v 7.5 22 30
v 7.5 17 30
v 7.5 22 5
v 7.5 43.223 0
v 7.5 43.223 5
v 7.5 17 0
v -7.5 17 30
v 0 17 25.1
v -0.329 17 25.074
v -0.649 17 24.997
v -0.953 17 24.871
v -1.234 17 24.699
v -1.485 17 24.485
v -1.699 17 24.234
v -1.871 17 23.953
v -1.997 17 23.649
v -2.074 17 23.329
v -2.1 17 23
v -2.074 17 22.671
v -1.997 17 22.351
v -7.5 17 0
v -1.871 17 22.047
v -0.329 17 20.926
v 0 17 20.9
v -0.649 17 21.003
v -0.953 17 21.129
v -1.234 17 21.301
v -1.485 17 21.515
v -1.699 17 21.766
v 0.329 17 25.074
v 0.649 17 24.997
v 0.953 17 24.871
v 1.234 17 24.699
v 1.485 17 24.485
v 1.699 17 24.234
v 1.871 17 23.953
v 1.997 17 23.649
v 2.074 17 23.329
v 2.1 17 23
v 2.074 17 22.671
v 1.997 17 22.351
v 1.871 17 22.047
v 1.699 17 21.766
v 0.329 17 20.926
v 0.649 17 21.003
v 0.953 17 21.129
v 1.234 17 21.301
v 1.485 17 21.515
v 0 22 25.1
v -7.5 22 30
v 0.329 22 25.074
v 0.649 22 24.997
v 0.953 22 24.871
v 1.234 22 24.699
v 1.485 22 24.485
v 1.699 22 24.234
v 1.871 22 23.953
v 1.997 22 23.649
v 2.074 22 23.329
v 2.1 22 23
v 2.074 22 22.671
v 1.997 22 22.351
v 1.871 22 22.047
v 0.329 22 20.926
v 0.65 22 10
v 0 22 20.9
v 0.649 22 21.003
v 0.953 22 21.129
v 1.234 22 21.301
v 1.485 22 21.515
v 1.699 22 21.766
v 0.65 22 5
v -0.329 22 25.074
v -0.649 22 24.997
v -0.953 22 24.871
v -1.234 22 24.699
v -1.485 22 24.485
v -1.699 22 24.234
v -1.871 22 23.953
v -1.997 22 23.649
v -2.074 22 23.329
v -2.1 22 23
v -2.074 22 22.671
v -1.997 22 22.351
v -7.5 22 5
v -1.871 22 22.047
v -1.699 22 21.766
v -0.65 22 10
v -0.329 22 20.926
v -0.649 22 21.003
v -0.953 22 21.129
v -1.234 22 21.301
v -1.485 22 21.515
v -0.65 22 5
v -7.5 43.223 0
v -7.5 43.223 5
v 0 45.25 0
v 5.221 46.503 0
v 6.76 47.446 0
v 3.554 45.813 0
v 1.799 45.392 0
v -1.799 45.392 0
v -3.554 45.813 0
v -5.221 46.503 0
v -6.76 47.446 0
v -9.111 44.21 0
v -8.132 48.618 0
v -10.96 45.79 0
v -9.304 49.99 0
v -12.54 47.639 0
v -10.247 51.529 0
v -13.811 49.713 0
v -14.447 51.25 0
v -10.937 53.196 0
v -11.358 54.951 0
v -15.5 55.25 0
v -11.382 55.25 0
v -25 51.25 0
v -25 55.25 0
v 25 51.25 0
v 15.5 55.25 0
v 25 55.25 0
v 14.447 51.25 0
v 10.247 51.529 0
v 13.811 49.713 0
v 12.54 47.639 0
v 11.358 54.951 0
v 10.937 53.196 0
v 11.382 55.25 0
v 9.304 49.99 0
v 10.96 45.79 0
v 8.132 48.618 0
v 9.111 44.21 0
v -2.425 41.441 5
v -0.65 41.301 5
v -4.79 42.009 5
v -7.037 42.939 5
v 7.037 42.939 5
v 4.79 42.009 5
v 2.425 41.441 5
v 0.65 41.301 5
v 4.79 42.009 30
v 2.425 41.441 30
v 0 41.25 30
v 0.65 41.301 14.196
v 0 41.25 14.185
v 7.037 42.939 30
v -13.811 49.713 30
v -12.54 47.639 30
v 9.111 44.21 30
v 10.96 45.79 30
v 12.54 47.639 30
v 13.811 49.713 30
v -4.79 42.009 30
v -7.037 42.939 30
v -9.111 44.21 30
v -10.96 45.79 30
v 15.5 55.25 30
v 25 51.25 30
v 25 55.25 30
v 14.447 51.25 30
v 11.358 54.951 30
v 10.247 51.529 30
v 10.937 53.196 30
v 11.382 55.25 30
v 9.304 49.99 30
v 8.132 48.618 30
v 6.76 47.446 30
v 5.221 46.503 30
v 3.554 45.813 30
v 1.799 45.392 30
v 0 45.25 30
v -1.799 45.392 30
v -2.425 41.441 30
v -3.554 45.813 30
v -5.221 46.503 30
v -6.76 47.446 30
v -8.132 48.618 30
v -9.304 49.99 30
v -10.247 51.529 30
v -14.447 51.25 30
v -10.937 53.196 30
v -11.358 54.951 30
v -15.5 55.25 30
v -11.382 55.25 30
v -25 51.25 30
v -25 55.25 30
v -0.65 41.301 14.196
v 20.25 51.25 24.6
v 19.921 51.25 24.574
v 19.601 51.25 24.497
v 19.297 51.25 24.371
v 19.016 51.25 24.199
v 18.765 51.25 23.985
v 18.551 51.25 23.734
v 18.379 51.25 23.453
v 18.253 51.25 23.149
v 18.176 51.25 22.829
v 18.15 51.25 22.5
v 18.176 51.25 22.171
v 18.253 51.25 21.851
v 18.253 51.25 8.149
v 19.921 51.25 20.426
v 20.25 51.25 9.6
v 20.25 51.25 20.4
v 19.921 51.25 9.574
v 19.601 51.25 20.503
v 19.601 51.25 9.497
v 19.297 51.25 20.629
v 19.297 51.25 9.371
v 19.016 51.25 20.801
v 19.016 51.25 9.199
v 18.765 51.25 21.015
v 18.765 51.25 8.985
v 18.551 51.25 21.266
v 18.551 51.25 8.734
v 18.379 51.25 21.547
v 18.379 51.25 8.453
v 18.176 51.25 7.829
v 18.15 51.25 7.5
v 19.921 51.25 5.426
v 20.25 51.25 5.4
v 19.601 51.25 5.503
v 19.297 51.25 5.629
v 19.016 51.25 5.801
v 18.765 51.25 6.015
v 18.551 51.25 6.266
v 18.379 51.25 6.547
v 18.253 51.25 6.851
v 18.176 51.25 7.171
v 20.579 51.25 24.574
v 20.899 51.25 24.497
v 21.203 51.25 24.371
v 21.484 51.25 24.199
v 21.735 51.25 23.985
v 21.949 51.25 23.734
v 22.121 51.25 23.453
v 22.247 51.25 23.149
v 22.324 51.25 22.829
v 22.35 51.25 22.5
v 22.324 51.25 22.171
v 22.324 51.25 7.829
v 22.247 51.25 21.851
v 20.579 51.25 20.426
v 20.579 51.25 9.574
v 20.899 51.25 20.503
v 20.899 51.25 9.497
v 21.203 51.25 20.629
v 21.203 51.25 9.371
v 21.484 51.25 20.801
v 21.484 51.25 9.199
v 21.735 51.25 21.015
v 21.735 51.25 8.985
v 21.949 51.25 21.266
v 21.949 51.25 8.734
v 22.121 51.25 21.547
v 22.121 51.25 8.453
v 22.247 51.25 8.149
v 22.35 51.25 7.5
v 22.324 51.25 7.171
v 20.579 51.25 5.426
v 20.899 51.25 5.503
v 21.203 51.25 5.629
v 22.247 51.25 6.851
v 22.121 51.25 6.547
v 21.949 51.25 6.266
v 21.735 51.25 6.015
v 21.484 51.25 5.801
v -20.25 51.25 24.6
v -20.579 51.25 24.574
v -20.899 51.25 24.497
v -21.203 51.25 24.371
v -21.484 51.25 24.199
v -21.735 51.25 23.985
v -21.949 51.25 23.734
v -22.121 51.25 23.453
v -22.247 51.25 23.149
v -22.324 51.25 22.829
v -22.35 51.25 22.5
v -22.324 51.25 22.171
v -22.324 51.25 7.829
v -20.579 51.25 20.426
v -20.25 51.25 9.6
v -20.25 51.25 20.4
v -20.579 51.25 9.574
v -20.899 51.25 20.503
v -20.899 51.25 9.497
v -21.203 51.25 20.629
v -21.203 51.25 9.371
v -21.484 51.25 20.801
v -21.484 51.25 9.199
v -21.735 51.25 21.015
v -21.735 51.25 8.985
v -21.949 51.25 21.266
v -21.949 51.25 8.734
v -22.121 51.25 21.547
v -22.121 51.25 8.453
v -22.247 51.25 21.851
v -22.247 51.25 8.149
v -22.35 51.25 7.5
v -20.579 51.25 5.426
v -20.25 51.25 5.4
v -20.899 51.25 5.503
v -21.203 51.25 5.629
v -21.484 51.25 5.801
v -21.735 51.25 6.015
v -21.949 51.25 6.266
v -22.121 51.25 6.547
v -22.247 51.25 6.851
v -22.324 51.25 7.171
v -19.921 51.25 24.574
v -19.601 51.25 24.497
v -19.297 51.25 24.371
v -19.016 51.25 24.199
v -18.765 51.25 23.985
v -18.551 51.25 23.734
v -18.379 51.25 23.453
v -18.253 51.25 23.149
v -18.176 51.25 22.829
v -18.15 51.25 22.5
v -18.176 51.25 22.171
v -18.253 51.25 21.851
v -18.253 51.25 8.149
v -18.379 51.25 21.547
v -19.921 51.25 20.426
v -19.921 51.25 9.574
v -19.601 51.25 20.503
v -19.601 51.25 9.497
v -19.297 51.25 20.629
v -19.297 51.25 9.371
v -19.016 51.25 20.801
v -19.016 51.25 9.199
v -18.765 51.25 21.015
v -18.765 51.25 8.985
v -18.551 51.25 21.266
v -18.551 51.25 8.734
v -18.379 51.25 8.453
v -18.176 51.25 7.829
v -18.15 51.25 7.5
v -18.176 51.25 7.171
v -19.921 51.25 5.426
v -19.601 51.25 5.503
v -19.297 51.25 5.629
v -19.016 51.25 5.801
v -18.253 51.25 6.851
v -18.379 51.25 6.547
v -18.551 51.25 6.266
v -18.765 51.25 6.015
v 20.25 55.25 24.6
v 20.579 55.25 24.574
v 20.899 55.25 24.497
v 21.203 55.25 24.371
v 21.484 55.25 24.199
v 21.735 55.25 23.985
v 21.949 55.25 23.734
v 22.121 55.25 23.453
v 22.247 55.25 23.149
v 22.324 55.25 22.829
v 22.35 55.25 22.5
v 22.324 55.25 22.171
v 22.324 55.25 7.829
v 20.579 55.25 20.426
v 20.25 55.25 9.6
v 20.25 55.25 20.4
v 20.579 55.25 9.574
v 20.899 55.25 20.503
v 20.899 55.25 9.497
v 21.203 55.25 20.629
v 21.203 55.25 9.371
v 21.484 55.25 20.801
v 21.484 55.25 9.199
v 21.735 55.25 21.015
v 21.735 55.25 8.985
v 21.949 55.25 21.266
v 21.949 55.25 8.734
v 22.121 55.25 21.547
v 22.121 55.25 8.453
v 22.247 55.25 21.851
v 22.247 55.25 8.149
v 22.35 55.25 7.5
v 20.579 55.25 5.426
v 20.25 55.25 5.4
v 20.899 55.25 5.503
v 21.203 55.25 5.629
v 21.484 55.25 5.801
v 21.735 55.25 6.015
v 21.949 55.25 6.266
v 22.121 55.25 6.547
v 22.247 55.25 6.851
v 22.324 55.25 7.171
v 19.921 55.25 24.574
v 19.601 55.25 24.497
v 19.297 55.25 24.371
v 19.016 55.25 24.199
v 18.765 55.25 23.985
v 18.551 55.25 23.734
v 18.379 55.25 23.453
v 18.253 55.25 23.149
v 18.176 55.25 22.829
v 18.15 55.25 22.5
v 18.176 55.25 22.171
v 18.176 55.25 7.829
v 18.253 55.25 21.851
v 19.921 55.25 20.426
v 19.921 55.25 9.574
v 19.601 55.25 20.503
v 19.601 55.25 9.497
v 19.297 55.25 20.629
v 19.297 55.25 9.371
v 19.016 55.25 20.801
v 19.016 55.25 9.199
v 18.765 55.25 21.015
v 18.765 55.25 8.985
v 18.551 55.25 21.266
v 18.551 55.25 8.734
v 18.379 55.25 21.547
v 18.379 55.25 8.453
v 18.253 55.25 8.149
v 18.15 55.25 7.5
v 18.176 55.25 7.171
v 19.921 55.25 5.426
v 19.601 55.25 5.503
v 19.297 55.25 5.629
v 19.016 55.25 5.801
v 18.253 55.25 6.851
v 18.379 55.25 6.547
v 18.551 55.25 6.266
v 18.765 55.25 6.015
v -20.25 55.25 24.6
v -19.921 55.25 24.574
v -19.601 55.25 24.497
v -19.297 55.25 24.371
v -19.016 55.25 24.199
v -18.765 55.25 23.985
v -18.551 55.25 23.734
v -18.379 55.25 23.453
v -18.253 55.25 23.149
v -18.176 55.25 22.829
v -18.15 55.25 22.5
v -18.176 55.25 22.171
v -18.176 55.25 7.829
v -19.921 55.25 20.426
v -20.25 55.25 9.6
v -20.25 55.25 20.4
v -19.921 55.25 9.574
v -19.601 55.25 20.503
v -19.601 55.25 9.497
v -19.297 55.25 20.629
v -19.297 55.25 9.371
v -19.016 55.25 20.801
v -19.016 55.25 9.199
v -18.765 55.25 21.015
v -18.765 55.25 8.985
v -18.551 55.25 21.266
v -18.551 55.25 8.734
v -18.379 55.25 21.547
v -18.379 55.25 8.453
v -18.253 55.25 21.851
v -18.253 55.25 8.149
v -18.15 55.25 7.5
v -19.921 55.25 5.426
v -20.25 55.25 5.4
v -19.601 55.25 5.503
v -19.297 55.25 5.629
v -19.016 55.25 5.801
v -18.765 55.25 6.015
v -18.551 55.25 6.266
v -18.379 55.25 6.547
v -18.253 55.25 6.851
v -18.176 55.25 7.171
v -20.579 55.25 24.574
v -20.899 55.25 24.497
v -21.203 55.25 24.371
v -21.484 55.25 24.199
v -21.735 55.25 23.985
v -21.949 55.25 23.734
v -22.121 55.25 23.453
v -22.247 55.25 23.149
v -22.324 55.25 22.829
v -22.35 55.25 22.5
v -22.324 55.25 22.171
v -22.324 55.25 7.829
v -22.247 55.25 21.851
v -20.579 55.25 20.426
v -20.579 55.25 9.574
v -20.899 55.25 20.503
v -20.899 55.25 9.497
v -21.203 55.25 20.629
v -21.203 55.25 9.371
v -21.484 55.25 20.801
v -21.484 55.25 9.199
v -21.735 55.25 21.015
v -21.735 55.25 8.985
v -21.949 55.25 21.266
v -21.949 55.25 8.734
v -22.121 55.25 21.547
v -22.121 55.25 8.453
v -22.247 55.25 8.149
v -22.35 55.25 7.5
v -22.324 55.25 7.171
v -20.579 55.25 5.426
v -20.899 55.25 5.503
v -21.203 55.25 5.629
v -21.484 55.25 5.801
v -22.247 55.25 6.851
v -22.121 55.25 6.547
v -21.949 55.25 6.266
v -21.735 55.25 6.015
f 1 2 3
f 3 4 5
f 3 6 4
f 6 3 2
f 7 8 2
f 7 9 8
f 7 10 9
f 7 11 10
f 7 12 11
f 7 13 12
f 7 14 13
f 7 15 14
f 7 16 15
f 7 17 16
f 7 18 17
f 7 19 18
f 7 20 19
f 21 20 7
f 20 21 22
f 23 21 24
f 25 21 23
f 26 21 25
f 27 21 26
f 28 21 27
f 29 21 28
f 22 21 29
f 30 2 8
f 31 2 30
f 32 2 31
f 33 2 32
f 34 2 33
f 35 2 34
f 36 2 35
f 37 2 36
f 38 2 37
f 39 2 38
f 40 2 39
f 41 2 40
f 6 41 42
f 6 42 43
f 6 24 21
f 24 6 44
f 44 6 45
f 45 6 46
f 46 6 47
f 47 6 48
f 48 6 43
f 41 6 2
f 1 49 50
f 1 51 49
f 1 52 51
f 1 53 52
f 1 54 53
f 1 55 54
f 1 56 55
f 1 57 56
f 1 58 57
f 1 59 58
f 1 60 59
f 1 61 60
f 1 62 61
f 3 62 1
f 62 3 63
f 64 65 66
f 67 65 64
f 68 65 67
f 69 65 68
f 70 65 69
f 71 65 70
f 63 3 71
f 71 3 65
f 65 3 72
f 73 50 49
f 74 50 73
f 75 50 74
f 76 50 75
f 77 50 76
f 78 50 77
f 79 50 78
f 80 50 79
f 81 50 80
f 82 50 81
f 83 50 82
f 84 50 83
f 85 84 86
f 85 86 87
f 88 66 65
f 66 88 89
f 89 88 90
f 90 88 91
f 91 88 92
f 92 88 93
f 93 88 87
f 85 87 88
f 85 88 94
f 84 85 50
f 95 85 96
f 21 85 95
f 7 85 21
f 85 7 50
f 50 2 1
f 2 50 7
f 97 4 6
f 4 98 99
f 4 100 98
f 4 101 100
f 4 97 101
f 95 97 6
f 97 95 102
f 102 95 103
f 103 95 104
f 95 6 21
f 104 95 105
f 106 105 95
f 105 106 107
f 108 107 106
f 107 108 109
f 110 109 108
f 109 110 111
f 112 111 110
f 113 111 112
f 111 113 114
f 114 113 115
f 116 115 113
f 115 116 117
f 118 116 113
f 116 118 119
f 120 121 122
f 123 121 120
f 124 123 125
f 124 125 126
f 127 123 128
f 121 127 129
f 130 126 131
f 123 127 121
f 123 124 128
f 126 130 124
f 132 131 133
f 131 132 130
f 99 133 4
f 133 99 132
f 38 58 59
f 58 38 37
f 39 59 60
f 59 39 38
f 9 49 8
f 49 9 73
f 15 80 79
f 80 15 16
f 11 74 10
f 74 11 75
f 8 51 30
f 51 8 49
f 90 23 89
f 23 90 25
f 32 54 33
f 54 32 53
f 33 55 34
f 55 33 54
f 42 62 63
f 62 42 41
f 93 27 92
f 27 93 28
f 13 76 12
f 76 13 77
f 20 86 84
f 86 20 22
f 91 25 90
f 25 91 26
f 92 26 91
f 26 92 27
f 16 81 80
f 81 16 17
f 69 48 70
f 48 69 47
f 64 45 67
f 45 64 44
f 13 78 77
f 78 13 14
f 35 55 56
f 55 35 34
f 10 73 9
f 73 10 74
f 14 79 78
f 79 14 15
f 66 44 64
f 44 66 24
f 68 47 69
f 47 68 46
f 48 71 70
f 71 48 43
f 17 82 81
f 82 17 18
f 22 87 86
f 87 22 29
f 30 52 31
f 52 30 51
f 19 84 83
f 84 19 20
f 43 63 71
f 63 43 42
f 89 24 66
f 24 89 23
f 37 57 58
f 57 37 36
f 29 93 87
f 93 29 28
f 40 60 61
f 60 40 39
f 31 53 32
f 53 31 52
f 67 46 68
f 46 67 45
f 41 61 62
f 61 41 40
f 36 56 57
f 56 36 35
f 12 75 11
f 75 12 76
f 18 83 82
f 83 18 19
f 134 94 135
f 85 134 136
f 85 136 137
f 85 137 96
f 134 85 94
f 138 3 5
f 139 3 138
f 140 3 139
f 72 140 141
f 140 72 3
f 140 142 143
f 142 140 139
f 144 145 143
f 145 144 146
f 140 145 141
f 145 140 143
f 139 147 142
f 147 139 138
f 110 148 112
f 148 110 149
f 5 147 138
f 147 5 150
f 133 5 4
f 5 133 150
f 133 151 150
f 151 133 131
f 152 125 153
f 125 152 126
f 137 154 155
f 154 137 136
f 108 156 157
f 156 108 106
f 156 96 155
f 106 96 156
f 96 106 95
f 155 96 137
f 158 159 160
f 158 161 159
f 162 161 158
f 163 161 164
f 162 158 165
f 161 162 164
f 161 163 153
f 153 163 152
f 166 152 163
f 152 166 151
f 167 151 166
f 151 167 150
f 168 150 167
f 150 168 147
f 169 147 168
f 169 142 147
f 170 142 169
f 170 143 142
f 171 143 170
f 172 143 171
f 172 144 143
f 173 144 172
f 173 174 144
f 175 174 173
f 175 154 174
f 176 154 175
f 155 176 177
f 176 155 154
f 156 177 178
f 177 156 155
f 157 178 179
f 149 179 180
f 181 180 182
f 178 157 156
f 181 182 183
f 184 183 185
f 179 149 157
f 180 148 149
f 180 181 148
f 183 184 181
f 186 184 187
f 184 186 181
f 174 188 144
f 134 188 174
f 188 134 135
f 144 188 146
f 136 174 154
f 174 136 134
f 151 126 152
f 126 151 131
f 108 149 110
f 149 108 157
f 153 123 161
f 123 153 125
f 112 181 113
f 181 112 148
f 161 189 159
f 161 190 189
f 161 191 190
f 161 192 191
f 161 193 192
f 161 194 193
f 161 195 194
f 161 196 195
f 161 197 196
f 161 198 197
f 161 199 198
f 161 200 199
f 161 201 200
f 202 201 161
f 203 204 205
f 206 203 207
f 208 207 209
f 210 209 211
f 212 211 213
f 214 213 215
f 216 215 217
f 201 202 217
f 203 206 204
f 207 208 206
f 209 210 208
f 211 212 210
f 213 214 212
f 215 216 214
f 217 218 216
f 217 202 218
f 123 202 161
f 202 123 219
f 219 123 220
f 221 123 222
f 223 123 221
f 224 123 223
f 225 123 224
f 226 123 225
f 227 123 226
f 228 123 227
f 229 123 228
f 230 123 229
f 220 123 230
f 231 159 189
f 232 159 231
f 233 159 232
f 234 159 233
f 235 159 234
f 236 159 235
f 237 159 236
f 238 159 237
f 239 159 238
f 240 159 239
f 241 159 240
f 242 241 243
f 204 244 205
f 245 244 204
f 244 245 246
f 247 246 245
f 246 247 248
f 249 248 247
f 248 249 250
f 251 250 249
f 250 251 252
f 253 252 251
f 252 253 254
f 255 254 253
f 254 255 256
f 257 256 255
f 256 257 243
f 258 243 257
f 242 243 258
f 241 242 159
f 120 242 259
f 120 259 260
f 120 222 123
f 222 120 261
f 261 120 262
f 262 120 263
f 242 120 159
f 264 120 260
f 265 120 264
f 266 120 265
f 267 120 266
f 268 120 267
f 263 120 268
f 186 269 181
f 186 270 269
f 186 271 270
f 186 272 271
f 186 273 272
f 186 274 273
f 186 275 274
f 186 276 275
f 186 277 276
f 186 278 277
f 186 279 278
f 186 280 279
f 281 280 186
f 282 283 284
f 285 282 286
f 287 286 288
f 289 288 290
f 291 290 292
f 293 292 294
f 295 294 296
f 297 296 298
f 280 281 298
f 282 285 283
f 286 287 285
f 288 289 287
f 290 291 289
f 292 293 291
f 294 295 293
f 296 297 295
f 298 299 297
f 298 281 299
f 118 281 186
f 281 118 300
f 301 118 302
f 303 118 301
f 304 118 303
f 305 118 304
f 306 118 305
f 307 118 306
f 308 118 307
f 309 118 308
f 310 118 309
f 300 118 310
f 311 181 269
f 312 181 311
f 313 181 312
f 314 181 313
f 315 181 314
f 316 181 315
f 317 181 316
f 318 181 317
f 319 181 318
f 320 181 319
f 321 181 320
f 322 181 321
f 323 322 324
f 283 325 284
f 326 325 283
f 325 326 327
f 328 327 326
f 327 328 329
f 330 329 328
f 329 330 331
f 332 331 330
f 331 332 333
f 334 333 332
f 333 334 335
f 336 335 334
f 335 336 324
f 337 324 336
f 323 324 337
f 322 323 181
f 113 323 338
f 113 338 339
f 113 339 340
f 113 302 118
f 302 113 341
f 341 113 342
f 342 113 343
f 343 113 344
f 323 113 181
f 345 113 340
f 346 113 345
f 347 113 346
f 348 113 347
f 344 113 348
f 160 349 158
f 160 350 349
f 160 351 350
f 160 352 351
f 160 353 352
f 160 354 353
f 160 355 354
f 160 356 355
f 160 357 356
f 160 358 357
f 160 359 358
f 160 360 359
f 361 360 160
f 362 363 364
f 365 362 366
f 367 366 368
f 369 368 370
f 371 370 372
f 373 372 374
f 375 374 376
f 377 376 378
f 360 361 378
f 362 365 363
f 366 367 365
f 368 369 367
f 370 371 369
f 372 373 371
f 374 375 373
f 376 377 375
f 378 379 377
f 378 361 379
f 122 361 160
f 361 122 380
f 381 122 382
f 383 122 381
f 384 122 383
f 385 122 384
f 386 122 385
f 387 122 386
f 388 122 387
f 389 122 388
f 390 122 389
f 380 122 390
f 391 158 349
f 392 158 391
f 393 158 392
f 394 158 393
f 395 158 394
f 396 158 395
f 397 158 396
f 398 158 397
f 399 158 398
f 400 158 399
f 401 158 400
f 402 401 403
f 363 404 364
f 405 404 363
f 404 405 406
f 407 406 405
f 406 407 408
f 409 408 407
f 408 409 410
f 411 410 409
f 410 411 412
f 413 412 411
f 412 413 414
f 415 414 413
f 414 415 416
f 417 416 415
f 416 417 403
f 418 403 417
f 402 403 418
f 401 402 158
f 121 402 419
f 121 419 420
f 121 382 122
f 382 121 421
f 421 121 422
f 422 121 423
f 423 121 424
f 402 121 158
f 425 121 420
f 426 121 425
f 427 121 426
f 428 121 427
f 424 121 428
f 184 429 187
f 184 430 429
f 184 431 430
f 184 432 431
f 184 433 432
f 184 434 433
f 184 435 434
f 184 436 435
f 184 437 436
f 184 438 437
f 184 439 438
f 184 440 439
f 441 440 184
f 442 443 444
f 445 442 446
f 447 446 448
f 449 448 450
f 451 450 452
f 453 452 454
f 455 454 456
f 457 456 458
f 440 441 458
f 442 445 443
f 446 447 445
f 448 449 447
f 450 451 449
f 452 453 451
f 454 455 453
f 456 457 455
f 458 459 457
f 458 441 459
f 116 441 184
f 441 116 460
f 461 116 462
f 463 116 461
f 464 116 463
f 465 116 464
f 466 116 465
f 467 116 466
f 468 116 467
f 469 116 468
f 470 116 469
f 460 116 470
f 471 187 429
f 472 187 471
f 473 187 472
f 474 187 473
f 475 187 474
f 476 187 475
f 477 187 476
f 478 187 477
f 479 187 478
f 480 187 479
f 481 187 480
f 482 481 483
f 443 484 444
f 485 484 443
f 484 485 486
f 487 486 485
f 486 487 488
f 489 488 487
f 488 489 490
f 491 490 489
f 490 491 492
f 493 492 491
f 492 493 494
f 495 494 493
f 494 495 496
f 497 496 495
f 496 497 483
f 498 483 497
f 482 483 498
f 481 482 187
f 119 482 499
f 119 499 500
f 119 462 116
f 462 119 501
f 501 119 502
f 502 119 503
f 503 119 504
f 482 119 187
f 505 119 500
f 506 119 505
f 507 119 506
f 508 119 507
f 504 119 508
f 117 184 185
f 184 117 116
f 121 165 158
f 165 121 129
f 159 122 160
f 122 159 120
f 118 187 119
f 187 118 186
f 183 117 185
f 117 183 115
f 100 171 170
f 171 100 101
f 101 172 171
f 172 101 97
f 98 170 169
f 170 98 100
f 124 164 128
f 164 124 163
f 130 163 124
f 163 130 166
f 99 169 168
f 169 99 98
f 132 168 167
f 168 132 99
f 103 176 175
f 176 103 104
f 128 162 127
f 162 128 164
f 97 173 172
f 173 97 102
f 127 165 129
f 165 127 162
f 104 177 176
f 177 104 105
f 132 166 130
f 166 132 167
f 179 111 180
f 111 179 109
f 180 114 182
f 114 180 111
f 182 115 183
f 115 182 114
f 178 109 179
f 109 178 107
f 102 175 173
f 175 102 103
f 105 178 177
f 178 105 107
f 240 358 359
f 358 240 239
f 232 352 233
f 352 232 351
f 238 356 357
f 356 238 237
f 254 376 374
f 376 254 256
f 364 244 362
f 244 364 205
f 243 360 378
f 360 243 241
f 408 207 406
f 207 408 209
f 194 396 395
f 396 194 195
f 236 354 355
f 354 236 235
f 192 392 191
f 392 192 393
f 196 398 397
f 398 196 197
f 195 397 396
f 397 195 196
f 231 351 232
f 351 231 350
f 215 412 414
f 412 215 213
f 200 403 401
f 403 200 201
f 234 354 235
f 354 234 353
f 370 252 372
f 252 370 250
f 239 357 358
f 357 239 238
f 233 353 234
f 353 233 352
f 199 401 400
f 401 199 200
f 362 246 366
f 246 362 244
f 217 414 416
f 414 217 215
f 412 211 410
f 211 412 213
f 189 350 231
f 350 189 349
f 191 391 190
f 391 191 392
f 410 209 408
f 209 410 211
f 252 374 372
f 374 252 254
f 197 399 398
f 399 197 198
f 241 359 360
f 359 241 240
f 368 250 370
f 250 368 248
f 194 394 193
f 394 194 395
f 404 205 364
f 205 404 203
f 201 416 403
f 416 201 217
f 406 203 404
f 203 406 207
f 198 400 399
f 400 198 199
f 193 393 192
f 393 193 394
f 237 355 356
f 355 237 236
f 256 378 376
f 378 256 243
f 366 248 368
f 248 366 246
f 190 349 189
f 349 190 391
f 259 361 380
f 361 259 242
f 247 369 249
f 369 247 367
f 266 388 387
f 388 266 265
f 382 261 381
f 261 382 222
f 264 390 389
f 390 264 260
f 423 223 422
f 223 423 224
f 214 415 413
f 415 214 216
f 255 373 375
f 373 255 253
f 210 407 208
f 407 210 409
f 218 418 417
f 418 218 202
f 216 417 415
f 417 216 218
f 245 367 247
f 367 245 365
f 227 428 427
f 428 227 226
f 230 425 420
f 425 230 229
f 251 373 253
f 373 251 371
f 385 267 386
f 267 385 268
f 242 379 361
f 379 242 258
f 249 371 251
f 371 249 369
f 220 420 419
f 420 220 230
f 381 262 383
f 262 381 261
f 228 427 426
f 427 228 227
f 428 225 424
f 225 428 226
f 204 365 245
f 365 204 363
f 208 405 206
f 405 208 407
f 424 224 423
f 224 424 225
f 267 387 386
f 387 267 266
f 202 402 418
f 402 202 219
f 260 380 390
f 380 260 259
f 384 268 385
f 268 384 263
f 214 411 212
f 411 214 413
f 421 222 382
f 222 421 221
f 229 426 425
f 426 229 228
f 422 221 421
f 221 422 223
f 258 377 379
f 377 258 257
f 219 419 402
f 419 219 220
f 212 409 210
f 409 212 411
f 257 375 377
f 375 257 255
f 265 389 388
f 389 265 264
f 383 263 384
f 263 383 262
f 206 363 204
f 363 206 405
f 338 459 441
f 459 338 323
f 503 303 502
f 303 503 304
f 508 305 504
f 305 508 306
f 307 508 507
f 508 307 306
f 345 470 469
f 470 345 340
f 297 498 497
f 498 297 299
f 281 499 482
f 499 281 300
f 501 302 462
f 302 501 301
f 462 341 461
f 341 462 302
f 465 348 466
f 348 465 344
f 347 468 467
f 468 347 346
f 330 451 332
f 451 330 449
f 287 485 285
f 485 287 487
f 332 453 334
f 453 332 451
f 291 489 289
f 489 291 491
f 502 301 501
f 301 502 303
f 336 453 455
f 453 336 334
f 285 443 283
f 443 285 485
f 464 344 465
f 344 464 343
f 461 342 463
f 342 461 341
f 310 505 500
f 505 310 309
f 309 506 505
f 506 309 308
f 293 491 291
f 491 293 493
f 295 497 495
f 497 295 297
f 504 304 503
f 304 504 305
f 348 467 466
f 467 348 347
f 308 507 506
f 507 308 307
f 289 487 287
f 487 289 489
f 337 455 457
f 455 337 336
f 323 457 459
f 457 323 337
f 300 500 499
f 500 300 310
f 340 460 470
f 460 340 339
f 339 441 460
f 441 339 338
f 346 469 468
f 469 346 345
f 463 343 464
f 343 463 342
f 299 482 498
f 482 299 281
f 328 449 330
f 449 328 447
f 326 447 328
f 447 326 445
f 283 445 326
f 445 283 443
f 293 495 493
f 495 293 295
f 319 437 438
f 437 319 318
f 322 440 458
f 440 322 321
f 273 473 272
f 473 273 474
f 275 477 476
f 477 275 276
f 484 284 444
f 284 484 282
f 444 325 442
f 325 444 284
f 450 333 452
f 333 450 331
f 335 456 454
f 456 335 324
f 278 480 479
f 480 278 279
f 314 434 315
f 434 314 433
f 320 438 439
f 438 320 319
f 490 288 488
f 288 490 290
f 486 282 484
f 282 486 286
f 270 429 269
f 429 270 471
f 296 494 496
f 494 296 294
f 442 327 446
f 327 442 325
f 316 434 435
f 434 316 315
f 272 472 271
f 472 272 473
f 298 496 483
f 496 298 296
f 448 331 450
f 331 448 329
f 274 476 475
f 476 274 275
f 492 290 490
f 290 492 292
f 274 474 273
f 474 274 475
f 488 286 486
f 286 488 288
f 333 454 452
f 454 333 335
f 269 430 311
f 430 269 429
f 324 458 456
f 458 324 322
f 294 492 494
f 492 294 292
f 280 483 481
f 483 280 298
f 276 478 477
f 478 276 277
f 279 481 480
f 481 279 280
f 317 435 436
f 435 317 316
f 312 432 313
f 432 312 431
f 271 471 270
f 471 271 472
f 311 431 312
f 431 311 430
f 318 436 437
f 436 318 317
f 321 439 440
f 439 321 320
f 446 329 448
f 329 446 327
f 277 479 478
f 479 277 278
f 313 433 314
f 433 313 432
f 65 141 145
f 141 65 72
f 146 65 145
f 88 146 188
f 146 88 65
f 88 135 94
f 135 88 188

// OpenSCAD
// file: ../SRC/ISLHOLDER01A_D04.scad
$fn=40; // model faces resolution.
include <../configuration2.scad>


//Drzak na sloup - cast bez drzaku anemometru
module ISLHOLDER01A_D04(){
	
difference()
    {
    union()
        {
        //základní válec
        cylinder(h=D02_vyska_uchytky,r=(D02_prumer_obruby+2*D02_sila_materialu)/2,center=true);
		//úchytové plošky		
        translate([D02_dotahova_vzdalenost+D02_sila_materialu/2,0,0]){cube([D02_sila_materialu,D02_delka_celeho_uchytu,D02_vyska_uchytky],center=true);}
		}
    
    //válec na odečet
    cylinder(h=D02_vyska_uchytky+0.01,r=D02_prumer_obruby/2,center=true);     
	        
    //kvádr na odecet
	translate([D02_dotahova_vzdalenost-(D02_prumer_obruby+2*D02_sila_materialu)/2,0,0]){cube([D02_prumer_obruby+2*D02_sila_materialu,D02_prumer_obruby+2*D02_sila_materialu,D02_vyska_uchytky+0.01],center=true);}
		
	//otvory na sroub
	translate([D02_dotahova_vzdalenost,(D02_delka_celeho_uchytu/2-D02_prumer_obruby/2-D02_sila_materialu)/2+D02_prumer_obruby/2+D02_sila_materialu,D02_vyska_uchytky/4]){rotate([0,90,0]){cylinder(h=D02_sila_materialu+0.01,r=D02_prumer_uchytneho_sroubu/2);}}
    
     //drzak matky
    translate([D02_dotahova_vzdalenost+D02_sila_materialu-D02_vyska_matky,(D02_delka_celeho_uchytu/2-D02_prumer_obruby/2-D02_sila_materialu)/2+D02_prumer_obruby/2+D02_sila_materialu,D02_vyska_uchytky/4]){rotate([0,90,0]){ cylinder (h = D02_vyska_matky+0.01, r= (D02_sirka_matky+0.2)/2, $fn=6);}}
   
     
        
    translate([D02_dotahova_vzdalenost,(D02_delka_celeho_uchytu/2-D02_prumer_obruby/2-D02_sila_materialu)/2+D02_prumer_obruby/2+D02_sila_materialu,-D02_vyska_uchytky/4]){rotate([0,90,0]){cylinder(h=D02_sila_materialu+0.01,r=D02_prumer_uchytneho_sroubu/2);}}
    
     //drzak matky
    translate([D02_dotahova_vzdalenost+D02_sila_materialu-D02_vyska_matky,(D02_delka_celeho_uchytu/2-D02_prumer_obruby/2-D02_sila_materialu)/2+D02_prumer_obruby/2+D02_sila_materialu,-D02_vyska_uchytky/4]){rotate([0,90,0]){ cylinder (h = D02_vyska_matky+0.01, r= (D02_sirka_matky+0.2)/2, $fn=6);}}
        
	translate([D02_dotahova_vzdalenost,-((D02_delka_celeho_uchytu/2-D02_prumer_obruby/2-D02_sila_materialu)/2+D02_prumer_obruby/2+D02_sila_materialu),-D02_vyska_uchytky/4]){rotate([0,90,0]){cylinder(h=D02_sila_materialu+0.01,r=D02_prumer_uchytneho_sroubu/2);}}
    
     //drzak matky
    translate([D02_dotahova_vzdalenost+D02_sila_materialu-D02_vyska_matky,-((D02_delka_celeho_uchytu/2-D02_prumer_obruby/2-D02_sila_materialu)/2+D02_prumer_obruby/2+D02_sila_materialu),-D02_vyska_uchytky/4]){rotate([0,90,0]){ cylinder (h = D02_vyska_matky+0.01, r= (D02_sirka_matky+0.2)/2, $fn=6);}}

    translate([D02_dotahova_vzdalenost,-((D02_delka_celeho_uchytu/2-D02_prumer_obruby/2-D02_sila_materialu)/2+D02_prumer_obruby/2+D02_sila_materialu),D02_vyska_uchytky/4]){rotate([0,90,0]){cylinder(h=D02_sila_materialu+0.01,r=D02_prumer_uchytneho_sroubu/2);}}	
    
     //drzak matky
    translate([D02_dotahova_vzdalenost+D02_sila_materialu-D02_vyska_matky,-((D02_delka_celeho_uchytu/2-D02_prumer_obruby/2-D02_sila_materialu)/2+D02_prumer_obruby/2+D02_sila_materialu),D02_vyska_uchytky/4]){rotate([0,90,0]){ cylinder (h = D02_vyska_matky+0.01, r= (D02_sirka_matky+0.2)/2, $fn=6);}}
	
    }
}

module ISLHOLDER01A_D04_2(){
	
difference()
    {
    union()
        {
        //základní válec
        cylinder(h=D02_vyska_uchytky,r=(D02_prumer_obruby+2*D02_sila_materialu)/2,center=true);
		//úchytové plošky		
        translate([D02_dotahova_vzdalenost+D02_sila_materialu/2,0,0]){cube([D02_sila_materialu,D02_delka_celeho_uchytu,D02_vyska_uchytky],center=true);}
		}
    
    //válec na odečet
    cylinder(h=D02_vyska_uchytky+0.01,r=D02_prumer_obruby/2,center=true);     
	        
    //kvádr na odecet
	translate([D02_dotahova_vzdalenost-(D02_prumer_obruby+2*D02_sila_materialu)/2,0,0]){cube([D02_prumer_obruby+2*D02_sila_materialu,D02_prumer_obruby+2*D02_sila_materialu,D02_vyska_uchytky+0.01],center=true);}
		
	//otvory na sroub
	translate([D02_dotahova_vzdalenost,(D02_delka_celeho_uchytu/2-D02_prumer_obruby/2-D02_sila_materialu)/2+D02_prumer_obruby/2+D02_sila_materialu,D02_vyska_uchytky/4]){rotate([0,90,0]){cylinder(h=D02_sila_materialu+0.01,r=D02_prumer_uchytneho_sroubu/2);}}
    
    
   
     
        
    translate([D02_dotahova_vzdalenost,(D02_delka_celeho_uchytu/2-D02_prumer_obruby/2-D02_sila_materialu)/2+D02_prumer_obruby/2+D02_sila_materialu,-D02_vyska_uchytky/4]){rotate([0,90,0]){cylinder(h=D02_sila_materialu+0.01,r=D02_prumer_uchytneho_sroubu/2);}}
    
     
        
	translate([D02_dotahova_vzdalenost,-((D02_delka_celeho_uchytu/2-D02_prumer_obruby/2-D02_sila_materialu)/2+D02_prumer_obruby/2+D02_sila_materialu),-D02_vyska_uchytky/4]){rotate([0,90,0]){cylinder(h=D02_sila_materialu+0.01,r=D02_prumer_uchytneho_sroubu/2);}}
    
    

    translate([D02_dotahova_vzdalenost,-((D02_delka_celeho_uchytu/2-D02_prumer_obruby/2-D02_sila_materialu)/2+D02_prumer_obruby/2+D02_sila_materialu),D02_vyska_uchytky/4]){rotate([0,90,0]){cylinder(h=D02_sila_materialu+0.01,r=D02_prumer_uchytneho_sroubu/2);}}	
    
    
	
    }
}


//ISLHOLDER01A_D02();
// file: ../SRC/ISLHOLDER01A_D03.scad
$fn=40; // model faces resolution.
include <../configuration2.scad>

include <ISLHOLDER01A_D04.scad>


PI=3.141592;

//Držák anemometru

module ISLHOLDER01A_D03()
{
difference()
    {
    union()  
        { 
        //výstuha
            translate([S01_sila_materialu/2,0,0])
        rotate ([0,-90,0])
            linear_extrude (height = S01_sila_materialu, convexity = 10)
                polygon(points=[[D02_vyska_uchytky/2,D01_delka_tyce+S01_prumer_vnitrni/2+D01_material_pred_zavitem+D02_sila_materialu-1],[0, D01_delka_tyce+S01_prumer_vnitrni/2+D01_material_pred_zavitem+D02_sila_materialu-1],[0,S01_prumer_vnitrni/2+D01_material_pred_zavitem],[D02_vyska_uchytky/3,S01_prumer_vnitrni/2+D01_material_pred_zavitem]]);   
  
         rotate ([90,0,0])     
translate([0,15,D01_material_pod_zavitem/2-S01_prumer_vnitrni/2-D01_material_pred_zavitem])
         difference() {   
  cube([D01_sirka_tyce,30,D01_material_pod_zavitem],center=true); 
translate([0,8,0])
cylinder(h=D01_material_pod_zavitem+0.01,r=D02_prumer_uchytneho_sroubu/2,center=true); 
}

        //uchyt na tyc
        translate([0,D01_delka_tyce/2+(S01_prumer_vnitrni-S01_tolerance_zavit)/2+D01_material_pred_zavitem,D01_material_pod_zavitem/2])
            cube([D01_sirka_tyce,D01_delka_tyce,D01_material_pod_zavitem],center=true); 
  
        //uchyt na tyc ovalna cast
        translate([0,(S01_prumer_vnitrni-S01_tolerance_zavit)/2+D01_material_pred_zavitem,D01_material_pod_zavitem/2])
            cube([D01_sirka_tyce,D01_material_za_zavitem+D01_material_pred_zavitem,D01_material_pod_zavitem],center=true);
      
        //material kolem uchytu na sloupek
        translate([0,D01_delka_tyce+(S01_prumer_vnitrni-S01_tolerance_zavit)/2+D01_material_pred_zavitem+(D02_sila_materialu+D02_prumer_obruby/2)/2-D02_dotahova_vzdalenost,D01_material_pod_zavitem/2])

        difference()
            {
            cube([D01_sirka_tyce,D02_sila_materialu+D02_prumer_obruby/2,D01_material_pod_zavitem],center=true);
            
            translate([0,D02_prumer_obruby/2-D02_dotahova_vzdalenost-D02_sila_materialu,0])    
                cylinder(h=D02_vyska_uchytky+0.01,r=D02_prumer_obruby/2,center=true);         
            }        
      
        //uchyt na sloupek
        translate([0,D01_delka_tyce+(S01_prumer_vnitrni-S01_tolerance_zavit)/2+D01_material_pred_zavitem+D02_sila_materialu+(D02_prumer_obruby)/2,D02_vyska_uchytky/2])
            rotate(a=[0,0,270])
                ISLHOLDER01A_D04_2();      

        }

    

    }
}
 
ISLHOLDER01A_D03();
 
// file: ../configuration2.scad
$fn=40; // model faces resolution.

//Parametry pro D03 a D04
//Nastavení držáku zkumavky
//----------------------------------------------------------------
//----------------------------------------------------------------
//není potřeba měnit
S01_prumer_vnitrni=40;
S01_tolerance_zavit=1.5;

S01_sila_materialu=1.3; //sila výtuhy

//D03 - uchyt velky
D01_material_pod_zavitem=5;
D01_material_za_zavitem=3;
D01_material_pred_zavitem=2;
D01_delka_tyce=20;
D01_sirka_tyce=15;

//D04 - uchyt na sloup
D02_sila_materialu=4;
D02_vyska_uchytky=30;
D02_prumer_obruby=23; //pruměr zkumavky
D02_delka_celeho_uchytu=50;
D02_dotahova_vzdalenost=1.5;
D02_prumer_uchytneho_sroubu=4.2;
D02_sirka_matky=9.1; //pro M4
D02_vyska_matky=3;
// main file
$fn=100; // model faces resolution.
include <../configuration2.scad>



use <../SRC/ISLHOLDER01A_D03.scad>


PI=3.141592;
 
ISLHOLDER01A_D03();


    
  
